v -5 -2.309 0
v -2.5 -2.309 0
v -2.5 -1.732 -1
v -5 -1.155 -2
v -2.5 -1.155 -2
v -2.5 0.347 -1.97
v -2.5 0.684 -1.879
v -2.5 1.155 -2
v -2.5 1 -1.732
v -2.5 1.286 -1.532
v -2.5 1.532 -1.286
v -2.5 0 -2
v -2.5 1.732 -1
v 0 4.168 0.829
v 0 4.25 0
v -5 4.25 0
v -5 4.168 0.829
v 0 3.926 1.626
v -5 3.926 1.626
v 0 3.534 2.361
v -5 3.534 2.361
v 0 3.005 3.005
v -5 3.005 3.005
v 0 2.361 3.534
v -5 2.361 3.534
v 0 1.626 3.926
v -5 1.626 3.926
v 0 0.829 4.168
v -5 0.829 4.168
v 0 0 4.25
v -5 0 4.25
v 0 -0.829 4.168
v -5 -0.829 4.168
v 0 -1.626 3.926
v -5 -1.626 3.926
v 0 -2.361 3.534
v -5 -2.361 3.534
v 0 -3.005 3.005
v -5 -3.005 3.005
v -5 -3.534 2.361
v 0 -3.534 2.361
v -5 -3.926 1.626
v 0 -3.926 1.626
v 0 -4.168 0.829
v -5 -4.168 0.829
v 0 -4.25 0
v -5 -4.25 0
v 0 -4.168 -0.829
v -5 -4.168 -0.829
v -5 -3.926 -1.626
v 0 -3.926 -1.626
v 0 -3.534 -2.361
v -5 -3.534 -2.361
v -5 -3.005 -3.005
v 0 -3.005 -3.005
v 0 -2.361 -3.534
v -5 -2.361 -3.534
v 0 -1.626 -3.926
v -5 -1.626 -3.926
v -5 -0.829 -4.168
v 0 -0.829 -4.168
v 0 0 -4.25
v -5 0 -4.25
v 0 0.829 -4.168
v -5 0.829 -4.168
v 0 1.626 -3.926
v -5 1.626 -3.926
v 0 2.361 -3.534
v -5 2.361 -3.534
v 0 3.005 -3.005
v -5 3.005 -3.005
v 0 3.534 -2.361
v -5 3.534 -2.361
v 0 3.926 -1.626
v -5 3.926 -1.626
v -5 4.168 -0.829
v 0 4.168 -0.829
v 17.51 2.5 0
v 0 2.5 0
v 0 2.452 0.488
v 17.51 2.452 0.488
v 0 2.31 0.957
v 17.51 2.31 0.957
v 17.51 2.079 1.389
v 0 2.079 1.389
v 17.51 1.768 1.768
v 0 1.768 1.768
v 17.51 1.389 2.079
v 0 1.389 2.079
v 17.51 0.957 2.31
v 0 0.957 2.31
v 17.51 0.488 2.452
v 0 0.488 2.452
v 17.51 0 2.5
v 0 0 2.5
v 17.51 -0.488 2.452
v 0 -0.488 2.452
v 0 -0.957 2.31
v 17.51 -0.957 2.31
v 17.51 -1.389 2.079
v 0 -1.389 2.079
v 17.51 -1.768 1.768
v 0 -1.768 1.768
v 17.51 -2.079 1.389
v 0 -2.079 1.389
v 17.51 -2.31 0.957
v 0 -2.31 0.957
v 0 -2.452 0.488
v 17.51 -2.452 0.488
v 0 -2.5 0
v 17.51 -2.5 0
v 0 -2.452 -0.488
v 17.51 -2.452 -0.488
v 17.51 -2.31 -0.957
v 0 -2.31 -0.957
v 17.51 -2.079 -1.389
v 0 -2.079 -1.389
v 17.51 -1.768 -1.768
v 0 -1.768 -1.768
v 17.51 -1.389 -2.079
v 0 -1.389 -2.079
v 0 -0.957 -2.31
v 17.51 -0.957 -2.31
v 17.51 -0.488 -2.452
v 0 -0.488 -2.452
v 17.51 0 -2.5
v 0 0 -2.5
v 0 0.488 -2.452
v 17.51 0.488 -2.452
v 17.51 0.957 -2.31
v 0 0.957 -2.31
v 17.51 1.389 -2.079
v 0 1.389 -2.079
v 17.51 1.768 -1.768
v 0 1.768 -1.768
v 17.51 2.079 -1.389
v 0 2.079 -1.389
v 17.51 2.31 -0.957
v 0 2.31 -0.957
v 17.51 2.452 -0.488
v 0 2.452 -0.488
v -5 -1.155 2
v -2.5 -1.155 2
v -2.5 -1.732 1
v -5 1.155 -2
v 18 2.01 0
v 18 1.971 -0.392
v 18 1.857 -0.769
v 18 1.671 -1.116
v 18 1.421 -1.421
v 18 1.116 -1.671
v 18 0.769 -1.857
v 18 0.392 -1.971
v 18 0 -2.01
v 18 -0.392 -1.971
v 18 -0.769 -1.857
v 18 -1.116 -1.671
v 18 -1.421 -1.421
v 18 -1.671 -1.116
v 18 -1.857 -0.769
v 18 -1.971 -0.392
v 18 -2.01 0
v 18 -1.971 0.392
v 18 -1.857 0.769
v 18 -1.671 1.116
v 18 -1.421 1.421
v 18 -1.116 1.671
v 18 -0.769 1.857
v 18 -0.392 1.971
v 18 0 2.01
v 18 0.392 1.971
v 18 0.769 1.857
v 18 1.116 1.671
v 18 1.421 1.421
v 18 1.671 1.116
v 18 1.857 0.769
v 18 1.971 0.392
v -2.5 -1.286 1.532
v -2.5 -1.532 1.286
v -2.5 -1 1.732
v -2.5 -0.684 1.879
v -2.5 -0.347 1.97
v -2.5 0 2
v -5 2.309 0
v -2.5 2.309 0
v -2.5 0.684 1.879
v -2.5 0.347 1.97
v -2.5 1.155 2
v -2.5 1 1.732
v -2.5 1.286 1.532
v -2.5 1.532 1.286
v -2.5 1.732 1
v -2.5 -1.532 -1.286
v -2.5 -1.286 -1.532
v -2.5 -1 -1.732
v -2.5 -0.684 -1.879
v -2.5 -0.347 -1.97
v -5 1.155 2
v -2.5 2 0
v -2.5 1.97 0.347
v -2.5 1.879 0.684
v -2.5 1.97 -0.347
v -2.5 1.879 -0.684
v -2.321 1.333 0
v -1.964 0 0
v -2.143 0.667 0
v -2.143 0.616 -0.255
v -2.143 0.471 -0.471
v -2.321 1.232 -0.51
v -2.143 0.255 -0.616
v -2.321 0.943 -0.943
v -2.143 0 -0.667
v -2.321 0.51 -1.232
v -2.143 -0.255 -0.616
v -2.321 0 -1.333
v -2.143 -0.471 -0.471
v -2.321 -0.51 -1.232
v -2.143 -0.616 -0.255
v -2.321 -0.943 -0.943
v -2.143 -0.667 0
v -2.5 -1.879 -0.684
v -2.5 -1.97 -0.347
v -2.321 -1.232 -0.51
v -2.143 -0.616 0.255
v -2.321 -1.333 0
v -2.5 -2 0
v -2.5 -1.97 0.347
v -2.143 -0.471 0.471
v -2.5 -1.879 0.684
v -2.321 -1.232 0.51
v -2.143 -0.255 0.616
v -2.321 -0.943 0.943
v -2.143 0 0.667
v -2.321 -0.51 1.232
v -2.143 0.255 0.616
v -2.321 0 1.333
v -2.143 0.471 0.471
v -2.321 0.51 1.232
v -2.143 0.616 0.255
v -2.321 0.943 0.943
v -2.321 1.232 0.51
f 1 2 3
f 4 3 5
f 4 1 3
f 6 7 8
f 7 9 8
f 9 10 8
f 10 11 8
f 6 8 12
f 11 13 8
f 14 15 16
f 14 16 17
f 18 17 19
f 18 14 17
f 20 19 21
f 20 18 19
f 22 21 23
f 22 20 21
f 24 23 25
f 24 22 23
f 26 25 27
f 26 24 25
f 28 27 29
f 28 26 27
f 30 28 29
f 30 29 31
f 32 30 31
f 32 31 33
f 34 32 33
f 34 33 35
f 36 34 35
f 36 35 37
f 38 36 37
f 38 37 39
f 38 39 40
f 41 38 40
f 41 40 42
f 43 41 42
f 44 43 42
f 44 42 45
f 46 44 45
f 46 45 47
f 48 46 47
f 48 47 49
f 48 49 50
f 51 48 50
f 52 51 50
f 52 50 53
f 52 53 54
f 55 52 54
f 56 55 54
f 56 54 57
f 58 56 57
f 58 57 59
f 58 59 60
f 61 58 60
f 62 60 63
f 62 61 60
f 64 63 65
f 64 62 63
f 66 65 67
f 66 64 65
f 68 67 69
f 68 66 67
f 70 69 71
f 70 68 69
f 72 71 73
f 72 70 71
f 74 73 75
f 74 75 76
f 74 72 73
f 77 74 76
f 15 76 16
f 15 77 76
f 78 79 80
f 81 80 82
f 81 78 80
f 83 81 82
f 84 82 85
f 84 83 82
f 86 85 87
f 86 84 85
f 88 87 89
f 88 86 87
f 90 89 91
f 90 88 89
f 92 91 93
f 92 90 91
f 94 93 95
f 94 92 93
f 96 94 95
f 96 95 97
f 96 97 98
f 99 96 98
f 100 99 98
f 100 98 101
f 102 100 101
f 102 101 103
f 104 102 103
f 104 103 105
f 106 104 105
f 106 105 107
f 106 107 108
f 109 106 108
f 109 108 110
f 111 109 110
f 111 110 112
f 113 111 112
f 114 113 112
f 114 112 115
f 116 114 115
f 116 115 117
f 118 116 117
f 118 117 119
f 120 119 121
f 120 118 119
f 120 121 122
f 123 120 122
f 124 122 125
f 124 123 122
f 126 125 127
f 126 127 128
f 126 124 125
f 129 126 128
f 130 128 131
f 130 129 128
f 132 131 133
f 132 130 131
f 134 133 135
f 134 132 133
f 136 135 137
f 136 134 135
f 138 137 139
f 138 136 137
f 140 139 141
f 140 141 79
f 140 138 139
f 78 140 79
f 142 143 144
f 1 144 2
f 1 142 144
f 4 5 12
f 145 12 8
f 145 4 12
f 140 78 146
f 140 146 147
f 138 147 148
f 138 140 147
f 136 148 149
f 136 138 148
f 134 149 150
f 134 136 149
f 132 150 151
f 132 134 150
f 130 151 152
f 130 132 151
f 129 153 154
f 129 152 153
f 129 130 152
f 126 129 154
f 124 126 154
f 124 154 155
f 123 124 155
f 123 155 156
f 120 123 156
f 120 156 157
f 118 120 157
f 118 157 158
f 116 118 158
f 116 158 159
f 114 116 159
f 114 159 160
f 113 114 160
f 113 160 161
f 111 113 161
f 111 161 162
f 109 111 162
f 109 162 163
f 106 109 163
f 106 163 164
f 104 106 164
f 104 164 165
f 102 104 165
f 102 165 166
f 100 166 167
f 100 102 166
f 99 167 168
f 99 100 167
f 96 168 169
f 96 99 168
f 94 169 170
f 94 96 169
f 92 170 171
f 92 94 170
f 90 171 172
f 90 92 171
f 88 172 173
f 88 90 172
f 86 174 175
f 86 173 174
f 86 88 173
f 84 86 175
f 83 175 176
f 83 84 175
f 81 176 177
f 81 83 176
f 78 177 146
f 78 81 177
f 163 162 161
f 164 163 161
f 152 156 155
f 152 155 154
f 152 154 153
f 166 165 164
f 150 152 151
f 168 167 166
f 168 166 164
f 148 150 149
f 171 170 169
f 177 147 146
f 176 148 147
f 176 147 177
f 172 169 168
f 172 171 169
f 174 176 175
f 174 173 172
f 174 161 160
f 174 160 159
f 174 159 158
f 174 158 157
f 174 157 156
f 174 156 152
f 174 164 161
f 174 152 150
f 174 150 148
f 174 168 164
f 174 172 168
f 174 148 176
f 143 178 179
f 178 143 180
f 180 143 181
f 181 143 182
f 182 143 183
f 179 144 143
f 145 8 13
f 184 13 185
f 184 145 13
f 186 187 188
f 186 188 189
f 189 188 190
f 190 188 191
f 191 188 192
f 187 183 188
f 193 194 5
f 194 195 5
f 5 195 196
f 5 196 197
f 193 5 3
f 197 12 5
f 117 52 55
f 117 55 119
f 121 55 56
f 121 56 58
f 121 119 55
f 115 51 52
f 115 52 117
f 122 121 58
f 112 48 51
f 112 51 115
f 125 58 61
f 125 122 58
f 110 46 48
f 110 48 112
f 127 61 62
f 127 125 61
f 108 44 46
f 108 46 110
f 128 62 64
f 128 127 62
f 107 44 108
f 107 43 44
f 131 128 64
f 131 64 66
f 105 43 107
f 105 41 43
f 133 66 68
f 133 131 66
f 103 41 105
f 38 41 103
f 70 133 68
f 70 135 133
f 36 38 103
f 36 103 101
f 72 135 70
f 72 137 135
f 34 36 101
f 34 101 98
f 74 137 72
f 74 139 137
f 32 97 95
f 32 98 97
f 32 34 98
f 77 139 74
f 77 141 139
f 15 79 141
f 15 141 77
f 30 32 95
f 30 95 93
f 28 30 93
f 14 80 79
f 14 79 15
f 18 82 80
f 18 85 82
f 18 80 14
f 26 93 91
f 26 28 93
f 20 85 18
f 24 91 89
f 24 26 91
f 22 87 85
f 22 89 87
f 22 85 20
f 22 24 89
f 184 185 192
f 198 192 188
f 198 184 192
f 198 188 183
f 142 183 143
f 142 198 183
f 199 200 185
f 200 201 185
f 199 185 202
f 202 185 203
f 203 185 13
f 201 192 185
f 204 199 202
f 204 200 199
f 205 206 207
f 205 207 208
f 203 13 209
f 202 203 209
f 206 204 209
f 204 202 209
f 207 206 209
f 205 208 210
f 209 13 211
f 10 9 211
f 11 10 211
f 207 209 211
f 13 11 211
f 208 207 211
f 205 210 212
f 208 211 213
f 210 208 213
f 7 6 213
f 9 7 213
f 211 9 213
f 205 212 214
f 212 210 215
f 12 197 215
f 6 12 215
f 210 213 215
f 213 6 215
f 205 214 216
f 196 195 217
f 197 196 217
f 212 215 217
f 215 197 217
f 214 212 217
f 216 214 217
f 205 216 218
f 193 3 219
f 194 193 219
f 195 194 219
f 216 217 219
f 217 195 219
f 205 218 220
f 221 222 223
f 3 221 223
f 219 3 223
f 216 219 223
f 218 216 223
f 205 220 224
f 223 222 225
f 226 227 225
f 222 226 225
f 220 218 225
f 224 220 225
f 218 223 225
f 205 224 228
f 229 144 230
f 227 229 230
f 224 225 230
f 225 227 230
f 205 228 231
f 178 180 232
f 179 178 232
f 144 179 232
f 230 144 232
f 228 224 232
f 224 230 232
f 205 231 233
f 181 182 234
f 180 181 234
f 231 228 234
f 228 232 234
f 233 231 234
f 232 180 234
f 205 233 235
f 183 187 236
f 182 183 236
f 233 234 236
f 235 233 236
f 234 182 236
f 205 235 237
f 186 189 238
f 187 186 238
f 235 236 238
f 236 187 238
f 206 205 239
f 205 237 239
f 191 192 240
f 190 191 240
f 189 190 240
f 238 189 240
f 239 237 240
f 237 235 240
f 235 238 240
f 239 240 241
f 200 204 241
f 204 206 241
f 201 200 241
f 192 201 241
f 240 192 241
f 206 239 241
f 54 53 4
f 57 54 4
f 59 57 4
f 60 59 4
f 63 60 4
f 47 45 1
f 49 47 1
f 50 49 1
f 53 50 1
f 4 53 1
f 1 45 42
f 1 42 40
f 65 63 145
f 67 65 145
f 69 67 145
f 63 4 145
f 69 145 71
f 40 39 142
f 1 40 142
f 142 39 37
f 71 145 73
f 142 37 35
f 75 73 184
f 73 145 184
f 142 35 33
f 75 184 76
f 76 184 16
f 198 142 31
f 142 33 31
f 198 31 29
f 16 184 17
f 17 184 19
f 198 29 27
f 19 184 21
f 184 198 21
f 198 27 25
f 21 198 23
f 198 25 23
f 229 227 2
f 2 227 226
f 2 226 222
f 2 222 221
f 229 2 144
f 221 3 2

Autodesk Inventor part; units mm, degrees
sketch "Sketch_1" plane through (0, 0, 0) normal (0, 0, 1) x (1, 0, 0)
  line L0 (18, 0) -> (-5, 0)
  line L1 (-5, 0) -> (-5, 4.25)
  line L2 (-5, 4.25) -> (0, 4.25)
  line L3 (0, 4.25) -> (0, 2.5)
  line L4 (0, 2.5) -> (17.5095, 2.5)
  line L5 (17.5095, 2.5) -> (18, 2.0095)
  line L6 (18, 2.0095) -> (18, 0)
  line L7 (18, 0) -> (-5, 0)
revolve "Revolution1" add sketch "Sketch_1" angle 360 about axis through (18, 0, 0) along (1, 0, 0)
thread "Thread1" size "M5x0.8" class "6g" standard "ISO Metric profile" length 17.5 offset 0.5
sketch "Sketch_4" plane through (0, 0, 0) normal (0, 0, 1) x (1, 0, 0)
  line L0 (-1.9641, 0) -> (-5, 0)
  line L1 (-5, 0) -> (-5, 2)
  line L2 (-5, 2) -> (-2.5, 2)
  line L3 (-2.5, 2) -> (-1.9641, 0)
  line L4 (-1.9641, 0) -> (-5, 0)
revolve "Revolution2" cut sketch "Sketch_4" angle 360 about axis through (-1.9641, 0, 0) along (1, 0, 0)
sketch "Sketch_3" plane through (-5, 0, 0) normal (1, 0, 0) x (0, 0, -1)
  line L0 (-2, 1.1547) -> (-2, -1.1547)
  line L1 (-2, -1.1547) -> (0, -2.3094)
  line L2 (0, -2.3094) -> (2, -1.1547)
  line L3 (2, -1.1547) -> (2, 1.1547)
  line L4 (2, 1.1547) -> (0, 2.3094)
  line L5 (0, 2.3094) -> (-2, 1.1547)
extrude "Extrusion1" cut sketch "Sketch_3" along normal blind 2.5
ref_plane "bolt_XY" through (0, 0, 0) normal (1, 0, 0) x (0, 0, -1)
ref_plane "bolt_YZ" through (0, 0, 0) normal (0, 0, -1) x (0, 1, 0)
ref_plane "bolt_ZX" through (0, 0, 0) normal (0, 1, 0) x (1, 0, 0)
ref_plane "nut_XY" through (18, 0, 0) normal (1, 0, 0) x (0, 0, -1)
ref_plane "nut_YZ" through (18, 0, 0) normal (0, 0, -1) x (0, 1, 0)
ref_plane "nut_ZX" through (18, 0, 0) normal (0, 1, 0) x (1, 0, 0)
properties part number "CBM5-18" material "MISUMI"
